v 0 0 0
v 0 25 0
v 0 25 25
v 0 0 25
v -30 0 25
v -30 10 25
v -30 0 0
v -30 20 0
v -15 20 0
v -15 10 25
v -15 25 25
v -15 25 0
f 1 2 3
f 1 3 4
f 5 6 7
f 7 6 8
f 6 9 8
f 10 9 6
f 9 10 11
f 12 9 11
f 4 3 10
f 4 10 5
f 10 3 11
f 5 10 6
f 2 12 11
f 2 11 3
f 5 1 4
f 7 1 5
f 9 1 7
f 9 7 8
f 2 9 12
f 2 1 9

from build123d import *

# Parameters (mm, degrees)
BOSS_EXTRUDE1_DEPTH = 25
BOSS_EXTRUDE4_DEPTH = 15


with BuildPart() as part:
    # Sketch1 → Boss-Extrude1 (new body)
    with BuildSketch(Plane.XY):
        Polygon((-15, 25), (0, 25), (0, 0), (-30, 0), (-30, 10), (-15, 10), align=None)
    extrude(amount=BOSS_EXTRUDE1_DEPTH)

    # Sketch5 → Boss-Extrude4 (add)
    with BuildSketch(Plane.ZY.offset(15)):
        Polygon((0, 10), (0, 20), (25, 10), align=None)
    extrude(amount=BOSS_EXTRUDE4_DEPTH)


solid = part.part
